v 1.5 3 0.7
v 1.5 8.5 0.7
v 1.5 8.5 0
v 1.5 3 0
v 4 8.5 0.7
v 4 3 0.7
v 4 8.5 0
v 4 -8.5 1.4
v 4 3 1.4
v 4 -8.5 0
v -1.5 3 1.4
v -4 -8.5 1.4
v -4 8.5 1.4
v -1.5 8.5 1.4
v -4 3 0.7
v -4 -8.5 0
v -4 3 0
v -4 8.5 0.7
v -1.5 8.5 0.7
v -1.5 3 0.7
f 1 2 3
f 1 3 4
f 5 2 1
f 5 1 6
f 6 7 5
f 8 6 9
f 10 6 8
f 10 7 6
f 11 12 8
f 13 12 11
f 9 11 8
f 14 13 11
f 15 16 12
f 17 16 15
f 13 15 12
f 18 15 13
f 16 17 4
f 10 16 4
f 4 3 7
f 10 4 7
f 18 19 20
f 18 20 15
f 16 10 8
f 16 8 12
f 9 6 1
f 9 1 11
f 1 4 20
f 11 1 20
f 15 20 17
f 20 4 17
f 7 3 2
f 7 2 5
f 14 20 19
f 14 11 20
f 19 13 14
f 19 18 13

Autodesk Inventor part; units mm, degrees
ref_plane "YZ Plane" through (0, 0, 0) normal (1, 0, 0) x (0, 1, 0)
ref_plane "XZ Plane" through (0, 0, 0) normal (0, 1, 0) x (-1, 0, 0)
ref_plane "XY Plane" through (0, 0, 0) normal (0, 0, 1) x (1, 0, 0)
sketch "Sketch1" plane through (0, 0, 0) normal (0, 0, 1) x (1, 0, 0)
  line L0 (-4, 8.5) -> (4, 8.5)
  line L1 (4, 8.5) -> (4, -8.5)
  line L2 (4, -8.5) -> (-4, -8.5)
  line L3 (-4, -8.5) -> (-4, 8.5)
  line L4 (-4, 8.5) -> (4, -8.5) construction
  line L5 (4, 8.5) -> (-4, -8.5) construction
  point P0 (0, 0)
  dimension "d0" = 8
  dimension "d1" = 17
extrude "Extrusion1" add sketch "Sketch1" along normal blind 1.4
sketch "Sketch2" plane through (0, 0, 1.4) normal (0, 0, 1) x (1, 0, 0)
  line L0 (4, 8.5) -> (-4, 8.5) projected
  line L1 (-1.5, 8.5) -> (1.5, 8.5)
  line L2 (1.5, 8.5) -> (1.5, 3)
  line L3 (1.5, 3) -> (-1.5, 3)
  line L4 (-1.5, 3) -> (-1.5, 8.5)
  line L5 (4, -8.5) -> (4, 8.5) projected
  point P0 (0, 0)
  point P1 (1.5, 8.5)
  dimension "d4" = 3
  dimension "d5" = 5.5
  dimension "d6" = 2.5
extrude "Extrusion2" cut sketch "Sketch2" against normal blind 1.4
sketch "Sketch3" plane through (0, 0, 1.4) normal (0, 0, 1) x (1, 0, 0)
  line L0 (4, 8.5) -> (1.5, 8.5) projected
  line L1 (4, -8.5) -> (4, 8.5) projected
  line L2 (1.5, 8.5) -> (4, 8.5)
  line L3 (4, 8.5) -> (4, 3)
  line L4 (4, 3) -> (1.5, 3)
  line L5 (1.5, 3) -> (1.5, 8.5)
  point P0 (0, 0)
  dimension "d9" = 5.5
extrude "Extrusion3" cut sketch "Sketch3" against normal blind 0.7
sketch "Sketch4" plane through (0, 0, 0) normal (0, 0, -1) x (-1, 0, 0)
  line L0 (1.5, 3) -> (-1.5, 3) projected
  line L1 (4, 8.5) -> (4, -8.5) projected
  line L2 (1.5, 3) -> (4, 3)
  line L3 (4, 3) -> (4, 8.5)
  line L4 (4, 8.5) -> (1.5, 8.5)
  line L5 (1.5, 8.5) -> (1.5, 3)
  point P0 (0, 0)
extrude "Extrusion4" cut sketch "Sketch4" against normal blind 0.7
properties part number "Thermistor"
